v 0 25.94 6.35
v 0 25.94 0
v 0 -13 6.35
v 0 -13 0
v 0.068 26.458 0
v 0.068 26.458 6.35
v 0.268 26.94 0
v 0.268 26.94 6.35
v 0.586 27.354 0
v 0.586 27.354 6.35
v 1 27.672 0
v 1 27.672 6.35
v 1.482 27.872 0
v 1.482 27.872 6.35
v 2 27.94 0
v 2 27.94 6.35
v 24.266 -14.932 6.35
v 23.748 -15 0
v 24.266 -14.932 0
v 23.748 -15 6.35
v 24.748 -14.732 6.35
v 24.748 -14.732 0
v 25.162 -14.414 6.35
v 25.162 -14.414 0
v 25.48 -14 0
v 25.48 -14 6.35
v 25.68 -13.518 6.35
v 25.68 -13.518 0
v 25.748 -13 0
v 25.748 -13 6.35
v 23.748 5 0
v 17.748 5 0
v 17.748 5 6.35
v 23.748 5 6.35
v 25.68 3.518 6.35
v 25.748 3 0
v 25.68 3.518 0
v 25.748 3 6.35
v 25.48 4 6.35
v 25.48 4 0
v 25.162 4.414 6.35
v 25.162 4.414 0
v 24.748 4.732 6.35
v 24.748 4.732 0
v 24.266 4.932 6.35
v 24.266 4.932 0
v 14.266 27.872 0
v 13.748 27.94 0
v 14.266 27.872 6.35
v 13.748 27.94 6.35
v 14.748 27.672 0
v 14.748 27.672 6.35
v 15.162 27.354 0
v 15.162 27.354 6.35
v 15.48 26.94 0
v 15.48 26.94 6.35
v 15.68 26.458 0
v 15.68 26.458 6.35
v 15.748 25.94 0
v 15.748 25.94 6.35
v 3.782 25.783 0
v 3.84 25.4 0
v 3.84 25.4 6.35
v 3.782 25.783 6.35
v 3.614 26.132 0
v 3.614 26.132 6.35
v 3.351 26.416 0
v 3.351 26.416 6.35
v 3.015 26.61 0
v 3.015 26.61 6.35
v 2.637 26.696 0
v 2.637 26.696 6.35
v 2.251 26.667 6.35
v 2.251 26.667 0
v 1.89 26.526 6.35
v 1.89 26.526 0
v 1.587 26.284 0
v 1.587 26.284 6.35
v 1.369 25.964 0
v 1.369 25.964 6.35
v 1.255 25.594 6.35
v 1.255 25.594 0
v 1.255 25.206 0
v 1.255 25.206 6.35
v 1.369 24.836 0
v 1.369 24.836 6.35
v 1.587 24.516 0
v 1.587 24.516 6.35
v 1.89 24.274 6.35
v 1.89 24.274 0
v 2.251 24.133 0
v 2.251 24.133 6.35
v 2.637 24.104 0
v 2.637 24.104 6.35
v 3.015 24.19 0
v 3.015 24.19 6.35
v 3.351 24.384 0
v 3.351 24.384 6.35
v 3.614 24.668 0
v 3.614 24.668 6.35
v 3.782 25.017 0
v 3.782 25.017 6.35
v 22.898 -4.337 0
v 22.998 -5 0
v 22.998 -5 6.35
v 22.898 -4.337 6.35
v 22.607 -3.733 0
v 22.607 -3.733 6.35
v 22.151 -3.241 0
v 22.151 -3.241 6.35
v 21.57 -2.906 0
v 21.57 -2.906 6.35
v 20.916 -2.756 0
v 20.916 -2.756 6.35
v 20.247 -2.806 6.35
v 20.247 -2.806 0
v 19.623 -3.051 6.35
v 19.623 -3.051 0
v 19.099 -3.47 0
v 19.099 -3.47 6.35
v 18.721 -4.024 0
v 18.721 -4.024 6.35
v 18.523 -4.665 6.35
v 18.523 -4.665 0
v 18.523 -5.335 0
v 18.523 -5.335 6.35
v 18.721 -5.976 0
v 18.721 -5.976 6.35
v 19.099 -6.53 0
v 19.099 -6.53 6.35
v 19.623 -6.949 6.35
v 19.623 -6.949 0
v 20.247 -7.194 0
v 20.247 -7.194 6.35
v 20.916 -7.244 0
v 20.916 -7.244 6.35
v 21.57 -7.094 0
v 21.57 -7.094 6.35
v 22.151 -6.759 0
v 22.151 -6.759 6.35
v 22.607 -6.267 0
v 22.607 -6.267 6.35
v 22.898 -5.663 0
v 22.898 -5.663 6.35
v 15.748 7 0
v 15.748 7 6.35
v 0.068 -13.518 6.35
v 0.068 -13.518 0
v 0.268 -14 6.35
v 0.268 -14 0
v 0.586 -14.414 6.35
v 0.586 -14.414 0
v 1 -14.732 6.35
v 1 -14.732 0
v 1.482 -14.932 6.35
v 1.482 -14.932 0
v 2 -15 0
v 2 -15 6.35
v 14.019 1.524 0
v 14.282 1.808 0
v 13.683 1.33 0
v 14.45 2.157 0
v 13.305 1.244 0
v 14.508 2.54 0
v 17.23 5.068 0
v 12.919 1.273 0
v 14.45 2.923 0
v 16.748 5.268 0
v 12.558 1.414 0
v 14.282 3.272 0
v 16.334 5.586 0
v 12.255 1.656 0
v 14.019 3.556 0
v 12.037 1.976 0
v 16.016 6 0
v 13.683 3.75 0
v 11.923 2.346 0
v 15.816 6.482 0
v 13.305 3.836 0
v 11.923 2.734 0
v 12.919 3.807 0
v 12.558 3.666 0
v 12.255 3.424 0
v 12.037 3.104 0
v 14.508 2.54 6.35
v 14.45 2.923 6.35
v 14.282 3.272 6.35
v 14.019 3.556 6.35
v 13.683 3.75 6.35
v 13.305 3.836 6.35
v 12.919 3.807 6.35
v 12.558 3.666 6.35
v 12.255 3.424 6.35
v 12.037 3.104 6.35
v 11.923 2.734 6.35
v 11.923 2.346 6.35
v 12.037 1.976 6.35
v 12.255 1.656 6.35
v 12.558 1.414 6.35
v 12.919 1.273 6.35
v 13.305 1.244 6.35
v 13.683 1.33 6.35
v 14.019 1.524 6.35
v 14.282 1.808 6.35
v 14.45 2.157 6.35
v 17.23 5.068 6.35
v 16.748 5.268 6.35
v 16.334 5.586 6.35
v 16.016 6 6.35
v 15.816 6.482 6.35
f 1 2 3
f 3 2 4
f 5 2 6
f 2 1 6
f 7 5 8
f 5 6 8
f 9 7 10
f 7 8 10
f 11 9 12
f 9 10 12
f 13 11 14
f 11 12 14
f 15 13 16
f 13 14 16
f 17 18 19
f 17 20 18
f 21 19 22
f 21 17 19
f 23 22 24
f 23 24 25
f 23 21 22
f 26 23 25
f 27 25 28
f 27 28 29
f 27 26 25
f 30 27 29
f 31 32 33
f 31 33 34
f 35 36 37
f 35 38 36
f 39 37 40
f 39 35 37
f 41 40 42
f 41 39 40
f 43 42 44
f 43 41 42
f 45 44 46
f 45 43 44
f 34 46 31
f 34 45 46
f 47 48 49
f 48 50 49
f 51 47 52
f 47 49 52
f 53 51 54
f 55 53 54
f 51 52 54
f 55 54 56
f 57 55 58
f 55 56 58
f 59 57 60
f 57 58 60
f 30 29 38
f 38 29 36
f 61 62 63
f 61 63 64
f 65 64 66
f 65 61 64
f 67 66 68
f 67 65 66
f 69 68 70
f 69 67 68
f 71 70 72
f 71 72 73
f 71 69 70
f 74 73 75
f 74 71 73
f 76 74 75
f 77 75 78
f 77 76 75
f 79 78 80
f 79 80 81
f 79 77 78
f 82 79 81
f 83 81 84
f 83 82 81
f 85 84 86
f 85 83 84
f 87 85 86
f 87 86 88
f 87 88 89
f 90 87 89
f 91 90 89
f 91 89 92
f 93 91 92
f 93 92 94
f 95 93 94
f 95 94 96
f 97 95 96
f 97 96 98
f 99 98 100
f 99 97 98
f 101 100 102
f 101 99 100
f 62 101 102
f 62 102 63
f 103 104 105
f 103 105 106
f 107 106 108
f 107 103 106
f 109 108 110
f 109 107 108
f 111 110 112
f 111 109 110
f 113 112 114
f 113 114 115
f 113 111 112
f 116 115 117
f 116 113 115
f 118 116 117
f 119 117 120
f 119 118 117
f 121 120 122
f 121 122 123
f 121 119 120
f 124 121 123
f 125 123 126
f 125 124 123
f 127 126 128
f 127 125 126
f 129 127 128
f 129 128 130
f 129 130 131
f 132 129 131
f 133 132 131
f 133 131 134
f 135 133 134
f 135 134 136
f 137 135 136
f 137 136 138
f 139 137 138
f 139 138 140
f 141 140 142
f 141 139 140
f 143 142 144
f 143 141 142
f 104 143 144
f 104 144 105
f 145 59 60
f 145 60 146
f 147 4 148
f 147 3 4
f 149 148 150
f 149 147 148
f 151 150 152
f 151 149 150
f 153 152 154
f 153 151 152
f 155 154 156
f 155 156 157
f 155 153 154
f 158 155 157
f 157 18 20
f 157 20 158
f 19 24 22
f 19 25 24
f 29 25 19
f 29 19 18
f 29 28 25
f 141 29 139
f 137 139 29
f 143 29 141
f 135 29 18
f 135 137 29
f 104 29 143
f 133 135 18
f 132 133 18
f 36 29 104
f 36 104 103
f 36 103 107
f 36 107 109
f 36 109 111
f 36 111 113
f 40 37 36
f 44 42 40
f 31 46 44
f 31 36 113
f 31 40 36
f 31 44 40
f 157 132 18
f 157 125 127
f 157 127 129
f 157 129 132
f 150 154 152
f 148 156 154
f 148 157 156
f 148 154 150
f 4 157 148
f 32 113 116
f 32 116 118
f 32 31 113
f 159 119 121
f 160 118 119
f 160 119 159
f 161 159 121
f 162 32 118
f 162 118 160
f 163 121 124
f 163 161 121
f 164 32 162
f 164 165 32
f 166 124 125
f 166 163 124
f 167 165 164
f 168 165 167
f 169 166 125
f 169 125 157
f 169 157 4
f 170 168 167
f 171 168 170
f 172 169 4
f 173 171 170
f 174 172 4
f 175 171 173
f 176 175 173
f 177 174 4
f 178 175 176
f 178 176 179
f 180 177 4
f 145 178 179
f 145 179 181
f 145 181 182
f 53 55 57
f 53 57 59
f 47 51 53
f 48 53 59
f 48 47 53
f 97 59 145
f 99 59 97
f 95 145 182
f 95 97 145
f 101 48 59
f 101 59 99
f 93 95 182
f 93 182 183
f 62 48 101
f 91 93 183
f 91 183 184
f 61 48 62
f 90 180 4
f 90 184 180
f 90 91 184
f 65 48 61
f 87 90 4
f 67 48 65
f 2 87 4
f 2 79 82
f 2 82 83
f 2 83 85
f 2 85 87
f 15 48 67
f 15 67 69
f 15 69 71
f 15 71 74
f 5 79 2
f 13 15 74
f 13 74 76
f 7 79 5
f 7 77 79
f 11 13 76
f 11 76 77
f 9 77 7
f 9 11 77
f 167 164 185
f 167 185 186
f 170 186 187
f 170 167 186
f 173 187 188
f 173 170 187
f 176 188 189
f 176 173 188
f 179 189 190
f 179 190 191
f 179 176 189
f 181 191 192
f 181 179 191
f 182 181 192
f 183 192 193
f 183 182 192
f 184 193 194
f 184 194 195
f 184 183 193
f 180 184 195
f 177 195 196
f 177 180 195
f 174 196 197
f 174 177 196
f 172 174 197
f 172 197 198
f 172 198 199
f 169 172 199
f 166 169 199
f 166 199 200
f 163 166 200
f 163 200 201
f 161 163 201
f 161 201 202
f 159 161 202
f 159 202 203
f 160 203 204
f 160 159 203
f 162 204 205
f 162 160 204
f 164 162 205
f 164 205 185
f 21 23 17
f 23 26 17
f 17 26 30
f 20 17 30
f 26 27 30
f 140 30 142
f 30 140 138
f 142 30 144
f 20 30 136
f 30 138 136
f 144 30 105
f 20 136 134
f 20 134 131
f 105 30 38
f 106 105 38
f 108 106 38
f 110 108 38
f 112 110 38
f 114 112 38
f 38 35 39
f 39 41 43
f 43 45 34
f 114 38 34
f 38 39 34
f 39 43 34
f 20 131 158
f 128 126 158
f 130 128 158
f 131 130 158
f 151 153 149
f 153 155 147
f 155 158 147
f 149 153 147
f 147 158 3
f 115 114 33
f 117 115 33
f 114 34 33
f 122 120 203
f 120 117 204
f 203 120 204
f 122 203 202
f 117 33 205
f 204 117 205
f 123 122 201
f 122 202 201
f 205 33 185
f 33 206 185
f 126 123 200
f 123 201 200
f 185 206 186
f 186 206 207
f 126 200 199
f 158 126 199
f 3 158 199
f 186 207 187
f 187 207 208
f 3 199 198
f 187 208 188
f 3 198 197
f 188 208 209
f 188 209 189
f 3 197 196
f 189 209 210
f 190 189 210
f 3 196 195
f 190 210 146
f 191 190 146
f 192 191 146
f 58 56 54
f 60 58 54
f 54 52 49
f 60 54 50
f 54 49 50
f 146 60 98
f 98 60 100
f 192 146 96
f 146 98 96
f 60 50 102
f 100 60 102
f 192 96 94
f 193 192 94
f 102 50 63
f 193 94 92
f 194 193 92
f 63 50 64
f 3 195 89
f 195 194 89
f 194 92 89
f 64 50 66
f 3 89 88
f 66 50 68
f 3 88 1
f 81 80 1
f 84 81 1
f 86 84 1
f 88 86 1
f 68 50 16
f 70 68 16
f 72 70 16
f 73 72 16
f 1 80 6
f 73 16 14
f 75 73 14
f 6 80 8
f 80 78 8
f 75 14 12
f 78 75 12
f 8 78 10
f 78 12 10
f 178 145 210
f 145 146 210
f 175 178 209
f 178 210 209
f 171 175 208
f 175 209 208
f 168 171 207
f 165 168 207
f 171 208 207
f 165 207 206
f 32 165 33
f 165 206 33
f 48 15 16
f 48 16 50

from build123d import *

# Parameters (mm, degrees)
SKETCH1_R           = 2.25
SKETCH1_R_2         = 1.3
BOSS_EXTRUDE1_DEPTH = 6.35
FILLET1_R           = 2


with BuildPart() as part:
    # Sketch1 → Boss-Extrude1 (new body)
    with BuildSketch(Plane.XY):
        Polygon((0, 0), (0, 27.94), (15.748, 27.94), (15.748, 5), (25.748, 5), (25.748, 0), (25.748, -15), (0, -15), align=None)
        with Locations((20.748, -5)):
            Circle(SKETCH1_R, mode=Mode.SUBTRACT)
        with Locations((2.54, 25.4)):
            Circle(SKETCH1_R_2, mode=Mode.SUBTRACT)
        with Locations((13.208, 2.54)):
            Circle(SKETCH1_R_2, mode=Mode.SUBTRACT)
    extrude(amount=BOSS_EXTRUDE1_DEPTH)

    # Fillet1
    fillet1_edges = [part.edges().sort_by_distance(p)[0] for p in [
        (0, 27.94, 3.175),
        (15.748, 27.94, 3.175),
        (15.748, 5, 3.175),
        (25.748, 5, 3.175),
        (25.748, -15, 3.175),
        (0, -15, 3.175),
    ]]
    fillet(fillet1_edges, radius=FILLET1_R)


solid = part.part
